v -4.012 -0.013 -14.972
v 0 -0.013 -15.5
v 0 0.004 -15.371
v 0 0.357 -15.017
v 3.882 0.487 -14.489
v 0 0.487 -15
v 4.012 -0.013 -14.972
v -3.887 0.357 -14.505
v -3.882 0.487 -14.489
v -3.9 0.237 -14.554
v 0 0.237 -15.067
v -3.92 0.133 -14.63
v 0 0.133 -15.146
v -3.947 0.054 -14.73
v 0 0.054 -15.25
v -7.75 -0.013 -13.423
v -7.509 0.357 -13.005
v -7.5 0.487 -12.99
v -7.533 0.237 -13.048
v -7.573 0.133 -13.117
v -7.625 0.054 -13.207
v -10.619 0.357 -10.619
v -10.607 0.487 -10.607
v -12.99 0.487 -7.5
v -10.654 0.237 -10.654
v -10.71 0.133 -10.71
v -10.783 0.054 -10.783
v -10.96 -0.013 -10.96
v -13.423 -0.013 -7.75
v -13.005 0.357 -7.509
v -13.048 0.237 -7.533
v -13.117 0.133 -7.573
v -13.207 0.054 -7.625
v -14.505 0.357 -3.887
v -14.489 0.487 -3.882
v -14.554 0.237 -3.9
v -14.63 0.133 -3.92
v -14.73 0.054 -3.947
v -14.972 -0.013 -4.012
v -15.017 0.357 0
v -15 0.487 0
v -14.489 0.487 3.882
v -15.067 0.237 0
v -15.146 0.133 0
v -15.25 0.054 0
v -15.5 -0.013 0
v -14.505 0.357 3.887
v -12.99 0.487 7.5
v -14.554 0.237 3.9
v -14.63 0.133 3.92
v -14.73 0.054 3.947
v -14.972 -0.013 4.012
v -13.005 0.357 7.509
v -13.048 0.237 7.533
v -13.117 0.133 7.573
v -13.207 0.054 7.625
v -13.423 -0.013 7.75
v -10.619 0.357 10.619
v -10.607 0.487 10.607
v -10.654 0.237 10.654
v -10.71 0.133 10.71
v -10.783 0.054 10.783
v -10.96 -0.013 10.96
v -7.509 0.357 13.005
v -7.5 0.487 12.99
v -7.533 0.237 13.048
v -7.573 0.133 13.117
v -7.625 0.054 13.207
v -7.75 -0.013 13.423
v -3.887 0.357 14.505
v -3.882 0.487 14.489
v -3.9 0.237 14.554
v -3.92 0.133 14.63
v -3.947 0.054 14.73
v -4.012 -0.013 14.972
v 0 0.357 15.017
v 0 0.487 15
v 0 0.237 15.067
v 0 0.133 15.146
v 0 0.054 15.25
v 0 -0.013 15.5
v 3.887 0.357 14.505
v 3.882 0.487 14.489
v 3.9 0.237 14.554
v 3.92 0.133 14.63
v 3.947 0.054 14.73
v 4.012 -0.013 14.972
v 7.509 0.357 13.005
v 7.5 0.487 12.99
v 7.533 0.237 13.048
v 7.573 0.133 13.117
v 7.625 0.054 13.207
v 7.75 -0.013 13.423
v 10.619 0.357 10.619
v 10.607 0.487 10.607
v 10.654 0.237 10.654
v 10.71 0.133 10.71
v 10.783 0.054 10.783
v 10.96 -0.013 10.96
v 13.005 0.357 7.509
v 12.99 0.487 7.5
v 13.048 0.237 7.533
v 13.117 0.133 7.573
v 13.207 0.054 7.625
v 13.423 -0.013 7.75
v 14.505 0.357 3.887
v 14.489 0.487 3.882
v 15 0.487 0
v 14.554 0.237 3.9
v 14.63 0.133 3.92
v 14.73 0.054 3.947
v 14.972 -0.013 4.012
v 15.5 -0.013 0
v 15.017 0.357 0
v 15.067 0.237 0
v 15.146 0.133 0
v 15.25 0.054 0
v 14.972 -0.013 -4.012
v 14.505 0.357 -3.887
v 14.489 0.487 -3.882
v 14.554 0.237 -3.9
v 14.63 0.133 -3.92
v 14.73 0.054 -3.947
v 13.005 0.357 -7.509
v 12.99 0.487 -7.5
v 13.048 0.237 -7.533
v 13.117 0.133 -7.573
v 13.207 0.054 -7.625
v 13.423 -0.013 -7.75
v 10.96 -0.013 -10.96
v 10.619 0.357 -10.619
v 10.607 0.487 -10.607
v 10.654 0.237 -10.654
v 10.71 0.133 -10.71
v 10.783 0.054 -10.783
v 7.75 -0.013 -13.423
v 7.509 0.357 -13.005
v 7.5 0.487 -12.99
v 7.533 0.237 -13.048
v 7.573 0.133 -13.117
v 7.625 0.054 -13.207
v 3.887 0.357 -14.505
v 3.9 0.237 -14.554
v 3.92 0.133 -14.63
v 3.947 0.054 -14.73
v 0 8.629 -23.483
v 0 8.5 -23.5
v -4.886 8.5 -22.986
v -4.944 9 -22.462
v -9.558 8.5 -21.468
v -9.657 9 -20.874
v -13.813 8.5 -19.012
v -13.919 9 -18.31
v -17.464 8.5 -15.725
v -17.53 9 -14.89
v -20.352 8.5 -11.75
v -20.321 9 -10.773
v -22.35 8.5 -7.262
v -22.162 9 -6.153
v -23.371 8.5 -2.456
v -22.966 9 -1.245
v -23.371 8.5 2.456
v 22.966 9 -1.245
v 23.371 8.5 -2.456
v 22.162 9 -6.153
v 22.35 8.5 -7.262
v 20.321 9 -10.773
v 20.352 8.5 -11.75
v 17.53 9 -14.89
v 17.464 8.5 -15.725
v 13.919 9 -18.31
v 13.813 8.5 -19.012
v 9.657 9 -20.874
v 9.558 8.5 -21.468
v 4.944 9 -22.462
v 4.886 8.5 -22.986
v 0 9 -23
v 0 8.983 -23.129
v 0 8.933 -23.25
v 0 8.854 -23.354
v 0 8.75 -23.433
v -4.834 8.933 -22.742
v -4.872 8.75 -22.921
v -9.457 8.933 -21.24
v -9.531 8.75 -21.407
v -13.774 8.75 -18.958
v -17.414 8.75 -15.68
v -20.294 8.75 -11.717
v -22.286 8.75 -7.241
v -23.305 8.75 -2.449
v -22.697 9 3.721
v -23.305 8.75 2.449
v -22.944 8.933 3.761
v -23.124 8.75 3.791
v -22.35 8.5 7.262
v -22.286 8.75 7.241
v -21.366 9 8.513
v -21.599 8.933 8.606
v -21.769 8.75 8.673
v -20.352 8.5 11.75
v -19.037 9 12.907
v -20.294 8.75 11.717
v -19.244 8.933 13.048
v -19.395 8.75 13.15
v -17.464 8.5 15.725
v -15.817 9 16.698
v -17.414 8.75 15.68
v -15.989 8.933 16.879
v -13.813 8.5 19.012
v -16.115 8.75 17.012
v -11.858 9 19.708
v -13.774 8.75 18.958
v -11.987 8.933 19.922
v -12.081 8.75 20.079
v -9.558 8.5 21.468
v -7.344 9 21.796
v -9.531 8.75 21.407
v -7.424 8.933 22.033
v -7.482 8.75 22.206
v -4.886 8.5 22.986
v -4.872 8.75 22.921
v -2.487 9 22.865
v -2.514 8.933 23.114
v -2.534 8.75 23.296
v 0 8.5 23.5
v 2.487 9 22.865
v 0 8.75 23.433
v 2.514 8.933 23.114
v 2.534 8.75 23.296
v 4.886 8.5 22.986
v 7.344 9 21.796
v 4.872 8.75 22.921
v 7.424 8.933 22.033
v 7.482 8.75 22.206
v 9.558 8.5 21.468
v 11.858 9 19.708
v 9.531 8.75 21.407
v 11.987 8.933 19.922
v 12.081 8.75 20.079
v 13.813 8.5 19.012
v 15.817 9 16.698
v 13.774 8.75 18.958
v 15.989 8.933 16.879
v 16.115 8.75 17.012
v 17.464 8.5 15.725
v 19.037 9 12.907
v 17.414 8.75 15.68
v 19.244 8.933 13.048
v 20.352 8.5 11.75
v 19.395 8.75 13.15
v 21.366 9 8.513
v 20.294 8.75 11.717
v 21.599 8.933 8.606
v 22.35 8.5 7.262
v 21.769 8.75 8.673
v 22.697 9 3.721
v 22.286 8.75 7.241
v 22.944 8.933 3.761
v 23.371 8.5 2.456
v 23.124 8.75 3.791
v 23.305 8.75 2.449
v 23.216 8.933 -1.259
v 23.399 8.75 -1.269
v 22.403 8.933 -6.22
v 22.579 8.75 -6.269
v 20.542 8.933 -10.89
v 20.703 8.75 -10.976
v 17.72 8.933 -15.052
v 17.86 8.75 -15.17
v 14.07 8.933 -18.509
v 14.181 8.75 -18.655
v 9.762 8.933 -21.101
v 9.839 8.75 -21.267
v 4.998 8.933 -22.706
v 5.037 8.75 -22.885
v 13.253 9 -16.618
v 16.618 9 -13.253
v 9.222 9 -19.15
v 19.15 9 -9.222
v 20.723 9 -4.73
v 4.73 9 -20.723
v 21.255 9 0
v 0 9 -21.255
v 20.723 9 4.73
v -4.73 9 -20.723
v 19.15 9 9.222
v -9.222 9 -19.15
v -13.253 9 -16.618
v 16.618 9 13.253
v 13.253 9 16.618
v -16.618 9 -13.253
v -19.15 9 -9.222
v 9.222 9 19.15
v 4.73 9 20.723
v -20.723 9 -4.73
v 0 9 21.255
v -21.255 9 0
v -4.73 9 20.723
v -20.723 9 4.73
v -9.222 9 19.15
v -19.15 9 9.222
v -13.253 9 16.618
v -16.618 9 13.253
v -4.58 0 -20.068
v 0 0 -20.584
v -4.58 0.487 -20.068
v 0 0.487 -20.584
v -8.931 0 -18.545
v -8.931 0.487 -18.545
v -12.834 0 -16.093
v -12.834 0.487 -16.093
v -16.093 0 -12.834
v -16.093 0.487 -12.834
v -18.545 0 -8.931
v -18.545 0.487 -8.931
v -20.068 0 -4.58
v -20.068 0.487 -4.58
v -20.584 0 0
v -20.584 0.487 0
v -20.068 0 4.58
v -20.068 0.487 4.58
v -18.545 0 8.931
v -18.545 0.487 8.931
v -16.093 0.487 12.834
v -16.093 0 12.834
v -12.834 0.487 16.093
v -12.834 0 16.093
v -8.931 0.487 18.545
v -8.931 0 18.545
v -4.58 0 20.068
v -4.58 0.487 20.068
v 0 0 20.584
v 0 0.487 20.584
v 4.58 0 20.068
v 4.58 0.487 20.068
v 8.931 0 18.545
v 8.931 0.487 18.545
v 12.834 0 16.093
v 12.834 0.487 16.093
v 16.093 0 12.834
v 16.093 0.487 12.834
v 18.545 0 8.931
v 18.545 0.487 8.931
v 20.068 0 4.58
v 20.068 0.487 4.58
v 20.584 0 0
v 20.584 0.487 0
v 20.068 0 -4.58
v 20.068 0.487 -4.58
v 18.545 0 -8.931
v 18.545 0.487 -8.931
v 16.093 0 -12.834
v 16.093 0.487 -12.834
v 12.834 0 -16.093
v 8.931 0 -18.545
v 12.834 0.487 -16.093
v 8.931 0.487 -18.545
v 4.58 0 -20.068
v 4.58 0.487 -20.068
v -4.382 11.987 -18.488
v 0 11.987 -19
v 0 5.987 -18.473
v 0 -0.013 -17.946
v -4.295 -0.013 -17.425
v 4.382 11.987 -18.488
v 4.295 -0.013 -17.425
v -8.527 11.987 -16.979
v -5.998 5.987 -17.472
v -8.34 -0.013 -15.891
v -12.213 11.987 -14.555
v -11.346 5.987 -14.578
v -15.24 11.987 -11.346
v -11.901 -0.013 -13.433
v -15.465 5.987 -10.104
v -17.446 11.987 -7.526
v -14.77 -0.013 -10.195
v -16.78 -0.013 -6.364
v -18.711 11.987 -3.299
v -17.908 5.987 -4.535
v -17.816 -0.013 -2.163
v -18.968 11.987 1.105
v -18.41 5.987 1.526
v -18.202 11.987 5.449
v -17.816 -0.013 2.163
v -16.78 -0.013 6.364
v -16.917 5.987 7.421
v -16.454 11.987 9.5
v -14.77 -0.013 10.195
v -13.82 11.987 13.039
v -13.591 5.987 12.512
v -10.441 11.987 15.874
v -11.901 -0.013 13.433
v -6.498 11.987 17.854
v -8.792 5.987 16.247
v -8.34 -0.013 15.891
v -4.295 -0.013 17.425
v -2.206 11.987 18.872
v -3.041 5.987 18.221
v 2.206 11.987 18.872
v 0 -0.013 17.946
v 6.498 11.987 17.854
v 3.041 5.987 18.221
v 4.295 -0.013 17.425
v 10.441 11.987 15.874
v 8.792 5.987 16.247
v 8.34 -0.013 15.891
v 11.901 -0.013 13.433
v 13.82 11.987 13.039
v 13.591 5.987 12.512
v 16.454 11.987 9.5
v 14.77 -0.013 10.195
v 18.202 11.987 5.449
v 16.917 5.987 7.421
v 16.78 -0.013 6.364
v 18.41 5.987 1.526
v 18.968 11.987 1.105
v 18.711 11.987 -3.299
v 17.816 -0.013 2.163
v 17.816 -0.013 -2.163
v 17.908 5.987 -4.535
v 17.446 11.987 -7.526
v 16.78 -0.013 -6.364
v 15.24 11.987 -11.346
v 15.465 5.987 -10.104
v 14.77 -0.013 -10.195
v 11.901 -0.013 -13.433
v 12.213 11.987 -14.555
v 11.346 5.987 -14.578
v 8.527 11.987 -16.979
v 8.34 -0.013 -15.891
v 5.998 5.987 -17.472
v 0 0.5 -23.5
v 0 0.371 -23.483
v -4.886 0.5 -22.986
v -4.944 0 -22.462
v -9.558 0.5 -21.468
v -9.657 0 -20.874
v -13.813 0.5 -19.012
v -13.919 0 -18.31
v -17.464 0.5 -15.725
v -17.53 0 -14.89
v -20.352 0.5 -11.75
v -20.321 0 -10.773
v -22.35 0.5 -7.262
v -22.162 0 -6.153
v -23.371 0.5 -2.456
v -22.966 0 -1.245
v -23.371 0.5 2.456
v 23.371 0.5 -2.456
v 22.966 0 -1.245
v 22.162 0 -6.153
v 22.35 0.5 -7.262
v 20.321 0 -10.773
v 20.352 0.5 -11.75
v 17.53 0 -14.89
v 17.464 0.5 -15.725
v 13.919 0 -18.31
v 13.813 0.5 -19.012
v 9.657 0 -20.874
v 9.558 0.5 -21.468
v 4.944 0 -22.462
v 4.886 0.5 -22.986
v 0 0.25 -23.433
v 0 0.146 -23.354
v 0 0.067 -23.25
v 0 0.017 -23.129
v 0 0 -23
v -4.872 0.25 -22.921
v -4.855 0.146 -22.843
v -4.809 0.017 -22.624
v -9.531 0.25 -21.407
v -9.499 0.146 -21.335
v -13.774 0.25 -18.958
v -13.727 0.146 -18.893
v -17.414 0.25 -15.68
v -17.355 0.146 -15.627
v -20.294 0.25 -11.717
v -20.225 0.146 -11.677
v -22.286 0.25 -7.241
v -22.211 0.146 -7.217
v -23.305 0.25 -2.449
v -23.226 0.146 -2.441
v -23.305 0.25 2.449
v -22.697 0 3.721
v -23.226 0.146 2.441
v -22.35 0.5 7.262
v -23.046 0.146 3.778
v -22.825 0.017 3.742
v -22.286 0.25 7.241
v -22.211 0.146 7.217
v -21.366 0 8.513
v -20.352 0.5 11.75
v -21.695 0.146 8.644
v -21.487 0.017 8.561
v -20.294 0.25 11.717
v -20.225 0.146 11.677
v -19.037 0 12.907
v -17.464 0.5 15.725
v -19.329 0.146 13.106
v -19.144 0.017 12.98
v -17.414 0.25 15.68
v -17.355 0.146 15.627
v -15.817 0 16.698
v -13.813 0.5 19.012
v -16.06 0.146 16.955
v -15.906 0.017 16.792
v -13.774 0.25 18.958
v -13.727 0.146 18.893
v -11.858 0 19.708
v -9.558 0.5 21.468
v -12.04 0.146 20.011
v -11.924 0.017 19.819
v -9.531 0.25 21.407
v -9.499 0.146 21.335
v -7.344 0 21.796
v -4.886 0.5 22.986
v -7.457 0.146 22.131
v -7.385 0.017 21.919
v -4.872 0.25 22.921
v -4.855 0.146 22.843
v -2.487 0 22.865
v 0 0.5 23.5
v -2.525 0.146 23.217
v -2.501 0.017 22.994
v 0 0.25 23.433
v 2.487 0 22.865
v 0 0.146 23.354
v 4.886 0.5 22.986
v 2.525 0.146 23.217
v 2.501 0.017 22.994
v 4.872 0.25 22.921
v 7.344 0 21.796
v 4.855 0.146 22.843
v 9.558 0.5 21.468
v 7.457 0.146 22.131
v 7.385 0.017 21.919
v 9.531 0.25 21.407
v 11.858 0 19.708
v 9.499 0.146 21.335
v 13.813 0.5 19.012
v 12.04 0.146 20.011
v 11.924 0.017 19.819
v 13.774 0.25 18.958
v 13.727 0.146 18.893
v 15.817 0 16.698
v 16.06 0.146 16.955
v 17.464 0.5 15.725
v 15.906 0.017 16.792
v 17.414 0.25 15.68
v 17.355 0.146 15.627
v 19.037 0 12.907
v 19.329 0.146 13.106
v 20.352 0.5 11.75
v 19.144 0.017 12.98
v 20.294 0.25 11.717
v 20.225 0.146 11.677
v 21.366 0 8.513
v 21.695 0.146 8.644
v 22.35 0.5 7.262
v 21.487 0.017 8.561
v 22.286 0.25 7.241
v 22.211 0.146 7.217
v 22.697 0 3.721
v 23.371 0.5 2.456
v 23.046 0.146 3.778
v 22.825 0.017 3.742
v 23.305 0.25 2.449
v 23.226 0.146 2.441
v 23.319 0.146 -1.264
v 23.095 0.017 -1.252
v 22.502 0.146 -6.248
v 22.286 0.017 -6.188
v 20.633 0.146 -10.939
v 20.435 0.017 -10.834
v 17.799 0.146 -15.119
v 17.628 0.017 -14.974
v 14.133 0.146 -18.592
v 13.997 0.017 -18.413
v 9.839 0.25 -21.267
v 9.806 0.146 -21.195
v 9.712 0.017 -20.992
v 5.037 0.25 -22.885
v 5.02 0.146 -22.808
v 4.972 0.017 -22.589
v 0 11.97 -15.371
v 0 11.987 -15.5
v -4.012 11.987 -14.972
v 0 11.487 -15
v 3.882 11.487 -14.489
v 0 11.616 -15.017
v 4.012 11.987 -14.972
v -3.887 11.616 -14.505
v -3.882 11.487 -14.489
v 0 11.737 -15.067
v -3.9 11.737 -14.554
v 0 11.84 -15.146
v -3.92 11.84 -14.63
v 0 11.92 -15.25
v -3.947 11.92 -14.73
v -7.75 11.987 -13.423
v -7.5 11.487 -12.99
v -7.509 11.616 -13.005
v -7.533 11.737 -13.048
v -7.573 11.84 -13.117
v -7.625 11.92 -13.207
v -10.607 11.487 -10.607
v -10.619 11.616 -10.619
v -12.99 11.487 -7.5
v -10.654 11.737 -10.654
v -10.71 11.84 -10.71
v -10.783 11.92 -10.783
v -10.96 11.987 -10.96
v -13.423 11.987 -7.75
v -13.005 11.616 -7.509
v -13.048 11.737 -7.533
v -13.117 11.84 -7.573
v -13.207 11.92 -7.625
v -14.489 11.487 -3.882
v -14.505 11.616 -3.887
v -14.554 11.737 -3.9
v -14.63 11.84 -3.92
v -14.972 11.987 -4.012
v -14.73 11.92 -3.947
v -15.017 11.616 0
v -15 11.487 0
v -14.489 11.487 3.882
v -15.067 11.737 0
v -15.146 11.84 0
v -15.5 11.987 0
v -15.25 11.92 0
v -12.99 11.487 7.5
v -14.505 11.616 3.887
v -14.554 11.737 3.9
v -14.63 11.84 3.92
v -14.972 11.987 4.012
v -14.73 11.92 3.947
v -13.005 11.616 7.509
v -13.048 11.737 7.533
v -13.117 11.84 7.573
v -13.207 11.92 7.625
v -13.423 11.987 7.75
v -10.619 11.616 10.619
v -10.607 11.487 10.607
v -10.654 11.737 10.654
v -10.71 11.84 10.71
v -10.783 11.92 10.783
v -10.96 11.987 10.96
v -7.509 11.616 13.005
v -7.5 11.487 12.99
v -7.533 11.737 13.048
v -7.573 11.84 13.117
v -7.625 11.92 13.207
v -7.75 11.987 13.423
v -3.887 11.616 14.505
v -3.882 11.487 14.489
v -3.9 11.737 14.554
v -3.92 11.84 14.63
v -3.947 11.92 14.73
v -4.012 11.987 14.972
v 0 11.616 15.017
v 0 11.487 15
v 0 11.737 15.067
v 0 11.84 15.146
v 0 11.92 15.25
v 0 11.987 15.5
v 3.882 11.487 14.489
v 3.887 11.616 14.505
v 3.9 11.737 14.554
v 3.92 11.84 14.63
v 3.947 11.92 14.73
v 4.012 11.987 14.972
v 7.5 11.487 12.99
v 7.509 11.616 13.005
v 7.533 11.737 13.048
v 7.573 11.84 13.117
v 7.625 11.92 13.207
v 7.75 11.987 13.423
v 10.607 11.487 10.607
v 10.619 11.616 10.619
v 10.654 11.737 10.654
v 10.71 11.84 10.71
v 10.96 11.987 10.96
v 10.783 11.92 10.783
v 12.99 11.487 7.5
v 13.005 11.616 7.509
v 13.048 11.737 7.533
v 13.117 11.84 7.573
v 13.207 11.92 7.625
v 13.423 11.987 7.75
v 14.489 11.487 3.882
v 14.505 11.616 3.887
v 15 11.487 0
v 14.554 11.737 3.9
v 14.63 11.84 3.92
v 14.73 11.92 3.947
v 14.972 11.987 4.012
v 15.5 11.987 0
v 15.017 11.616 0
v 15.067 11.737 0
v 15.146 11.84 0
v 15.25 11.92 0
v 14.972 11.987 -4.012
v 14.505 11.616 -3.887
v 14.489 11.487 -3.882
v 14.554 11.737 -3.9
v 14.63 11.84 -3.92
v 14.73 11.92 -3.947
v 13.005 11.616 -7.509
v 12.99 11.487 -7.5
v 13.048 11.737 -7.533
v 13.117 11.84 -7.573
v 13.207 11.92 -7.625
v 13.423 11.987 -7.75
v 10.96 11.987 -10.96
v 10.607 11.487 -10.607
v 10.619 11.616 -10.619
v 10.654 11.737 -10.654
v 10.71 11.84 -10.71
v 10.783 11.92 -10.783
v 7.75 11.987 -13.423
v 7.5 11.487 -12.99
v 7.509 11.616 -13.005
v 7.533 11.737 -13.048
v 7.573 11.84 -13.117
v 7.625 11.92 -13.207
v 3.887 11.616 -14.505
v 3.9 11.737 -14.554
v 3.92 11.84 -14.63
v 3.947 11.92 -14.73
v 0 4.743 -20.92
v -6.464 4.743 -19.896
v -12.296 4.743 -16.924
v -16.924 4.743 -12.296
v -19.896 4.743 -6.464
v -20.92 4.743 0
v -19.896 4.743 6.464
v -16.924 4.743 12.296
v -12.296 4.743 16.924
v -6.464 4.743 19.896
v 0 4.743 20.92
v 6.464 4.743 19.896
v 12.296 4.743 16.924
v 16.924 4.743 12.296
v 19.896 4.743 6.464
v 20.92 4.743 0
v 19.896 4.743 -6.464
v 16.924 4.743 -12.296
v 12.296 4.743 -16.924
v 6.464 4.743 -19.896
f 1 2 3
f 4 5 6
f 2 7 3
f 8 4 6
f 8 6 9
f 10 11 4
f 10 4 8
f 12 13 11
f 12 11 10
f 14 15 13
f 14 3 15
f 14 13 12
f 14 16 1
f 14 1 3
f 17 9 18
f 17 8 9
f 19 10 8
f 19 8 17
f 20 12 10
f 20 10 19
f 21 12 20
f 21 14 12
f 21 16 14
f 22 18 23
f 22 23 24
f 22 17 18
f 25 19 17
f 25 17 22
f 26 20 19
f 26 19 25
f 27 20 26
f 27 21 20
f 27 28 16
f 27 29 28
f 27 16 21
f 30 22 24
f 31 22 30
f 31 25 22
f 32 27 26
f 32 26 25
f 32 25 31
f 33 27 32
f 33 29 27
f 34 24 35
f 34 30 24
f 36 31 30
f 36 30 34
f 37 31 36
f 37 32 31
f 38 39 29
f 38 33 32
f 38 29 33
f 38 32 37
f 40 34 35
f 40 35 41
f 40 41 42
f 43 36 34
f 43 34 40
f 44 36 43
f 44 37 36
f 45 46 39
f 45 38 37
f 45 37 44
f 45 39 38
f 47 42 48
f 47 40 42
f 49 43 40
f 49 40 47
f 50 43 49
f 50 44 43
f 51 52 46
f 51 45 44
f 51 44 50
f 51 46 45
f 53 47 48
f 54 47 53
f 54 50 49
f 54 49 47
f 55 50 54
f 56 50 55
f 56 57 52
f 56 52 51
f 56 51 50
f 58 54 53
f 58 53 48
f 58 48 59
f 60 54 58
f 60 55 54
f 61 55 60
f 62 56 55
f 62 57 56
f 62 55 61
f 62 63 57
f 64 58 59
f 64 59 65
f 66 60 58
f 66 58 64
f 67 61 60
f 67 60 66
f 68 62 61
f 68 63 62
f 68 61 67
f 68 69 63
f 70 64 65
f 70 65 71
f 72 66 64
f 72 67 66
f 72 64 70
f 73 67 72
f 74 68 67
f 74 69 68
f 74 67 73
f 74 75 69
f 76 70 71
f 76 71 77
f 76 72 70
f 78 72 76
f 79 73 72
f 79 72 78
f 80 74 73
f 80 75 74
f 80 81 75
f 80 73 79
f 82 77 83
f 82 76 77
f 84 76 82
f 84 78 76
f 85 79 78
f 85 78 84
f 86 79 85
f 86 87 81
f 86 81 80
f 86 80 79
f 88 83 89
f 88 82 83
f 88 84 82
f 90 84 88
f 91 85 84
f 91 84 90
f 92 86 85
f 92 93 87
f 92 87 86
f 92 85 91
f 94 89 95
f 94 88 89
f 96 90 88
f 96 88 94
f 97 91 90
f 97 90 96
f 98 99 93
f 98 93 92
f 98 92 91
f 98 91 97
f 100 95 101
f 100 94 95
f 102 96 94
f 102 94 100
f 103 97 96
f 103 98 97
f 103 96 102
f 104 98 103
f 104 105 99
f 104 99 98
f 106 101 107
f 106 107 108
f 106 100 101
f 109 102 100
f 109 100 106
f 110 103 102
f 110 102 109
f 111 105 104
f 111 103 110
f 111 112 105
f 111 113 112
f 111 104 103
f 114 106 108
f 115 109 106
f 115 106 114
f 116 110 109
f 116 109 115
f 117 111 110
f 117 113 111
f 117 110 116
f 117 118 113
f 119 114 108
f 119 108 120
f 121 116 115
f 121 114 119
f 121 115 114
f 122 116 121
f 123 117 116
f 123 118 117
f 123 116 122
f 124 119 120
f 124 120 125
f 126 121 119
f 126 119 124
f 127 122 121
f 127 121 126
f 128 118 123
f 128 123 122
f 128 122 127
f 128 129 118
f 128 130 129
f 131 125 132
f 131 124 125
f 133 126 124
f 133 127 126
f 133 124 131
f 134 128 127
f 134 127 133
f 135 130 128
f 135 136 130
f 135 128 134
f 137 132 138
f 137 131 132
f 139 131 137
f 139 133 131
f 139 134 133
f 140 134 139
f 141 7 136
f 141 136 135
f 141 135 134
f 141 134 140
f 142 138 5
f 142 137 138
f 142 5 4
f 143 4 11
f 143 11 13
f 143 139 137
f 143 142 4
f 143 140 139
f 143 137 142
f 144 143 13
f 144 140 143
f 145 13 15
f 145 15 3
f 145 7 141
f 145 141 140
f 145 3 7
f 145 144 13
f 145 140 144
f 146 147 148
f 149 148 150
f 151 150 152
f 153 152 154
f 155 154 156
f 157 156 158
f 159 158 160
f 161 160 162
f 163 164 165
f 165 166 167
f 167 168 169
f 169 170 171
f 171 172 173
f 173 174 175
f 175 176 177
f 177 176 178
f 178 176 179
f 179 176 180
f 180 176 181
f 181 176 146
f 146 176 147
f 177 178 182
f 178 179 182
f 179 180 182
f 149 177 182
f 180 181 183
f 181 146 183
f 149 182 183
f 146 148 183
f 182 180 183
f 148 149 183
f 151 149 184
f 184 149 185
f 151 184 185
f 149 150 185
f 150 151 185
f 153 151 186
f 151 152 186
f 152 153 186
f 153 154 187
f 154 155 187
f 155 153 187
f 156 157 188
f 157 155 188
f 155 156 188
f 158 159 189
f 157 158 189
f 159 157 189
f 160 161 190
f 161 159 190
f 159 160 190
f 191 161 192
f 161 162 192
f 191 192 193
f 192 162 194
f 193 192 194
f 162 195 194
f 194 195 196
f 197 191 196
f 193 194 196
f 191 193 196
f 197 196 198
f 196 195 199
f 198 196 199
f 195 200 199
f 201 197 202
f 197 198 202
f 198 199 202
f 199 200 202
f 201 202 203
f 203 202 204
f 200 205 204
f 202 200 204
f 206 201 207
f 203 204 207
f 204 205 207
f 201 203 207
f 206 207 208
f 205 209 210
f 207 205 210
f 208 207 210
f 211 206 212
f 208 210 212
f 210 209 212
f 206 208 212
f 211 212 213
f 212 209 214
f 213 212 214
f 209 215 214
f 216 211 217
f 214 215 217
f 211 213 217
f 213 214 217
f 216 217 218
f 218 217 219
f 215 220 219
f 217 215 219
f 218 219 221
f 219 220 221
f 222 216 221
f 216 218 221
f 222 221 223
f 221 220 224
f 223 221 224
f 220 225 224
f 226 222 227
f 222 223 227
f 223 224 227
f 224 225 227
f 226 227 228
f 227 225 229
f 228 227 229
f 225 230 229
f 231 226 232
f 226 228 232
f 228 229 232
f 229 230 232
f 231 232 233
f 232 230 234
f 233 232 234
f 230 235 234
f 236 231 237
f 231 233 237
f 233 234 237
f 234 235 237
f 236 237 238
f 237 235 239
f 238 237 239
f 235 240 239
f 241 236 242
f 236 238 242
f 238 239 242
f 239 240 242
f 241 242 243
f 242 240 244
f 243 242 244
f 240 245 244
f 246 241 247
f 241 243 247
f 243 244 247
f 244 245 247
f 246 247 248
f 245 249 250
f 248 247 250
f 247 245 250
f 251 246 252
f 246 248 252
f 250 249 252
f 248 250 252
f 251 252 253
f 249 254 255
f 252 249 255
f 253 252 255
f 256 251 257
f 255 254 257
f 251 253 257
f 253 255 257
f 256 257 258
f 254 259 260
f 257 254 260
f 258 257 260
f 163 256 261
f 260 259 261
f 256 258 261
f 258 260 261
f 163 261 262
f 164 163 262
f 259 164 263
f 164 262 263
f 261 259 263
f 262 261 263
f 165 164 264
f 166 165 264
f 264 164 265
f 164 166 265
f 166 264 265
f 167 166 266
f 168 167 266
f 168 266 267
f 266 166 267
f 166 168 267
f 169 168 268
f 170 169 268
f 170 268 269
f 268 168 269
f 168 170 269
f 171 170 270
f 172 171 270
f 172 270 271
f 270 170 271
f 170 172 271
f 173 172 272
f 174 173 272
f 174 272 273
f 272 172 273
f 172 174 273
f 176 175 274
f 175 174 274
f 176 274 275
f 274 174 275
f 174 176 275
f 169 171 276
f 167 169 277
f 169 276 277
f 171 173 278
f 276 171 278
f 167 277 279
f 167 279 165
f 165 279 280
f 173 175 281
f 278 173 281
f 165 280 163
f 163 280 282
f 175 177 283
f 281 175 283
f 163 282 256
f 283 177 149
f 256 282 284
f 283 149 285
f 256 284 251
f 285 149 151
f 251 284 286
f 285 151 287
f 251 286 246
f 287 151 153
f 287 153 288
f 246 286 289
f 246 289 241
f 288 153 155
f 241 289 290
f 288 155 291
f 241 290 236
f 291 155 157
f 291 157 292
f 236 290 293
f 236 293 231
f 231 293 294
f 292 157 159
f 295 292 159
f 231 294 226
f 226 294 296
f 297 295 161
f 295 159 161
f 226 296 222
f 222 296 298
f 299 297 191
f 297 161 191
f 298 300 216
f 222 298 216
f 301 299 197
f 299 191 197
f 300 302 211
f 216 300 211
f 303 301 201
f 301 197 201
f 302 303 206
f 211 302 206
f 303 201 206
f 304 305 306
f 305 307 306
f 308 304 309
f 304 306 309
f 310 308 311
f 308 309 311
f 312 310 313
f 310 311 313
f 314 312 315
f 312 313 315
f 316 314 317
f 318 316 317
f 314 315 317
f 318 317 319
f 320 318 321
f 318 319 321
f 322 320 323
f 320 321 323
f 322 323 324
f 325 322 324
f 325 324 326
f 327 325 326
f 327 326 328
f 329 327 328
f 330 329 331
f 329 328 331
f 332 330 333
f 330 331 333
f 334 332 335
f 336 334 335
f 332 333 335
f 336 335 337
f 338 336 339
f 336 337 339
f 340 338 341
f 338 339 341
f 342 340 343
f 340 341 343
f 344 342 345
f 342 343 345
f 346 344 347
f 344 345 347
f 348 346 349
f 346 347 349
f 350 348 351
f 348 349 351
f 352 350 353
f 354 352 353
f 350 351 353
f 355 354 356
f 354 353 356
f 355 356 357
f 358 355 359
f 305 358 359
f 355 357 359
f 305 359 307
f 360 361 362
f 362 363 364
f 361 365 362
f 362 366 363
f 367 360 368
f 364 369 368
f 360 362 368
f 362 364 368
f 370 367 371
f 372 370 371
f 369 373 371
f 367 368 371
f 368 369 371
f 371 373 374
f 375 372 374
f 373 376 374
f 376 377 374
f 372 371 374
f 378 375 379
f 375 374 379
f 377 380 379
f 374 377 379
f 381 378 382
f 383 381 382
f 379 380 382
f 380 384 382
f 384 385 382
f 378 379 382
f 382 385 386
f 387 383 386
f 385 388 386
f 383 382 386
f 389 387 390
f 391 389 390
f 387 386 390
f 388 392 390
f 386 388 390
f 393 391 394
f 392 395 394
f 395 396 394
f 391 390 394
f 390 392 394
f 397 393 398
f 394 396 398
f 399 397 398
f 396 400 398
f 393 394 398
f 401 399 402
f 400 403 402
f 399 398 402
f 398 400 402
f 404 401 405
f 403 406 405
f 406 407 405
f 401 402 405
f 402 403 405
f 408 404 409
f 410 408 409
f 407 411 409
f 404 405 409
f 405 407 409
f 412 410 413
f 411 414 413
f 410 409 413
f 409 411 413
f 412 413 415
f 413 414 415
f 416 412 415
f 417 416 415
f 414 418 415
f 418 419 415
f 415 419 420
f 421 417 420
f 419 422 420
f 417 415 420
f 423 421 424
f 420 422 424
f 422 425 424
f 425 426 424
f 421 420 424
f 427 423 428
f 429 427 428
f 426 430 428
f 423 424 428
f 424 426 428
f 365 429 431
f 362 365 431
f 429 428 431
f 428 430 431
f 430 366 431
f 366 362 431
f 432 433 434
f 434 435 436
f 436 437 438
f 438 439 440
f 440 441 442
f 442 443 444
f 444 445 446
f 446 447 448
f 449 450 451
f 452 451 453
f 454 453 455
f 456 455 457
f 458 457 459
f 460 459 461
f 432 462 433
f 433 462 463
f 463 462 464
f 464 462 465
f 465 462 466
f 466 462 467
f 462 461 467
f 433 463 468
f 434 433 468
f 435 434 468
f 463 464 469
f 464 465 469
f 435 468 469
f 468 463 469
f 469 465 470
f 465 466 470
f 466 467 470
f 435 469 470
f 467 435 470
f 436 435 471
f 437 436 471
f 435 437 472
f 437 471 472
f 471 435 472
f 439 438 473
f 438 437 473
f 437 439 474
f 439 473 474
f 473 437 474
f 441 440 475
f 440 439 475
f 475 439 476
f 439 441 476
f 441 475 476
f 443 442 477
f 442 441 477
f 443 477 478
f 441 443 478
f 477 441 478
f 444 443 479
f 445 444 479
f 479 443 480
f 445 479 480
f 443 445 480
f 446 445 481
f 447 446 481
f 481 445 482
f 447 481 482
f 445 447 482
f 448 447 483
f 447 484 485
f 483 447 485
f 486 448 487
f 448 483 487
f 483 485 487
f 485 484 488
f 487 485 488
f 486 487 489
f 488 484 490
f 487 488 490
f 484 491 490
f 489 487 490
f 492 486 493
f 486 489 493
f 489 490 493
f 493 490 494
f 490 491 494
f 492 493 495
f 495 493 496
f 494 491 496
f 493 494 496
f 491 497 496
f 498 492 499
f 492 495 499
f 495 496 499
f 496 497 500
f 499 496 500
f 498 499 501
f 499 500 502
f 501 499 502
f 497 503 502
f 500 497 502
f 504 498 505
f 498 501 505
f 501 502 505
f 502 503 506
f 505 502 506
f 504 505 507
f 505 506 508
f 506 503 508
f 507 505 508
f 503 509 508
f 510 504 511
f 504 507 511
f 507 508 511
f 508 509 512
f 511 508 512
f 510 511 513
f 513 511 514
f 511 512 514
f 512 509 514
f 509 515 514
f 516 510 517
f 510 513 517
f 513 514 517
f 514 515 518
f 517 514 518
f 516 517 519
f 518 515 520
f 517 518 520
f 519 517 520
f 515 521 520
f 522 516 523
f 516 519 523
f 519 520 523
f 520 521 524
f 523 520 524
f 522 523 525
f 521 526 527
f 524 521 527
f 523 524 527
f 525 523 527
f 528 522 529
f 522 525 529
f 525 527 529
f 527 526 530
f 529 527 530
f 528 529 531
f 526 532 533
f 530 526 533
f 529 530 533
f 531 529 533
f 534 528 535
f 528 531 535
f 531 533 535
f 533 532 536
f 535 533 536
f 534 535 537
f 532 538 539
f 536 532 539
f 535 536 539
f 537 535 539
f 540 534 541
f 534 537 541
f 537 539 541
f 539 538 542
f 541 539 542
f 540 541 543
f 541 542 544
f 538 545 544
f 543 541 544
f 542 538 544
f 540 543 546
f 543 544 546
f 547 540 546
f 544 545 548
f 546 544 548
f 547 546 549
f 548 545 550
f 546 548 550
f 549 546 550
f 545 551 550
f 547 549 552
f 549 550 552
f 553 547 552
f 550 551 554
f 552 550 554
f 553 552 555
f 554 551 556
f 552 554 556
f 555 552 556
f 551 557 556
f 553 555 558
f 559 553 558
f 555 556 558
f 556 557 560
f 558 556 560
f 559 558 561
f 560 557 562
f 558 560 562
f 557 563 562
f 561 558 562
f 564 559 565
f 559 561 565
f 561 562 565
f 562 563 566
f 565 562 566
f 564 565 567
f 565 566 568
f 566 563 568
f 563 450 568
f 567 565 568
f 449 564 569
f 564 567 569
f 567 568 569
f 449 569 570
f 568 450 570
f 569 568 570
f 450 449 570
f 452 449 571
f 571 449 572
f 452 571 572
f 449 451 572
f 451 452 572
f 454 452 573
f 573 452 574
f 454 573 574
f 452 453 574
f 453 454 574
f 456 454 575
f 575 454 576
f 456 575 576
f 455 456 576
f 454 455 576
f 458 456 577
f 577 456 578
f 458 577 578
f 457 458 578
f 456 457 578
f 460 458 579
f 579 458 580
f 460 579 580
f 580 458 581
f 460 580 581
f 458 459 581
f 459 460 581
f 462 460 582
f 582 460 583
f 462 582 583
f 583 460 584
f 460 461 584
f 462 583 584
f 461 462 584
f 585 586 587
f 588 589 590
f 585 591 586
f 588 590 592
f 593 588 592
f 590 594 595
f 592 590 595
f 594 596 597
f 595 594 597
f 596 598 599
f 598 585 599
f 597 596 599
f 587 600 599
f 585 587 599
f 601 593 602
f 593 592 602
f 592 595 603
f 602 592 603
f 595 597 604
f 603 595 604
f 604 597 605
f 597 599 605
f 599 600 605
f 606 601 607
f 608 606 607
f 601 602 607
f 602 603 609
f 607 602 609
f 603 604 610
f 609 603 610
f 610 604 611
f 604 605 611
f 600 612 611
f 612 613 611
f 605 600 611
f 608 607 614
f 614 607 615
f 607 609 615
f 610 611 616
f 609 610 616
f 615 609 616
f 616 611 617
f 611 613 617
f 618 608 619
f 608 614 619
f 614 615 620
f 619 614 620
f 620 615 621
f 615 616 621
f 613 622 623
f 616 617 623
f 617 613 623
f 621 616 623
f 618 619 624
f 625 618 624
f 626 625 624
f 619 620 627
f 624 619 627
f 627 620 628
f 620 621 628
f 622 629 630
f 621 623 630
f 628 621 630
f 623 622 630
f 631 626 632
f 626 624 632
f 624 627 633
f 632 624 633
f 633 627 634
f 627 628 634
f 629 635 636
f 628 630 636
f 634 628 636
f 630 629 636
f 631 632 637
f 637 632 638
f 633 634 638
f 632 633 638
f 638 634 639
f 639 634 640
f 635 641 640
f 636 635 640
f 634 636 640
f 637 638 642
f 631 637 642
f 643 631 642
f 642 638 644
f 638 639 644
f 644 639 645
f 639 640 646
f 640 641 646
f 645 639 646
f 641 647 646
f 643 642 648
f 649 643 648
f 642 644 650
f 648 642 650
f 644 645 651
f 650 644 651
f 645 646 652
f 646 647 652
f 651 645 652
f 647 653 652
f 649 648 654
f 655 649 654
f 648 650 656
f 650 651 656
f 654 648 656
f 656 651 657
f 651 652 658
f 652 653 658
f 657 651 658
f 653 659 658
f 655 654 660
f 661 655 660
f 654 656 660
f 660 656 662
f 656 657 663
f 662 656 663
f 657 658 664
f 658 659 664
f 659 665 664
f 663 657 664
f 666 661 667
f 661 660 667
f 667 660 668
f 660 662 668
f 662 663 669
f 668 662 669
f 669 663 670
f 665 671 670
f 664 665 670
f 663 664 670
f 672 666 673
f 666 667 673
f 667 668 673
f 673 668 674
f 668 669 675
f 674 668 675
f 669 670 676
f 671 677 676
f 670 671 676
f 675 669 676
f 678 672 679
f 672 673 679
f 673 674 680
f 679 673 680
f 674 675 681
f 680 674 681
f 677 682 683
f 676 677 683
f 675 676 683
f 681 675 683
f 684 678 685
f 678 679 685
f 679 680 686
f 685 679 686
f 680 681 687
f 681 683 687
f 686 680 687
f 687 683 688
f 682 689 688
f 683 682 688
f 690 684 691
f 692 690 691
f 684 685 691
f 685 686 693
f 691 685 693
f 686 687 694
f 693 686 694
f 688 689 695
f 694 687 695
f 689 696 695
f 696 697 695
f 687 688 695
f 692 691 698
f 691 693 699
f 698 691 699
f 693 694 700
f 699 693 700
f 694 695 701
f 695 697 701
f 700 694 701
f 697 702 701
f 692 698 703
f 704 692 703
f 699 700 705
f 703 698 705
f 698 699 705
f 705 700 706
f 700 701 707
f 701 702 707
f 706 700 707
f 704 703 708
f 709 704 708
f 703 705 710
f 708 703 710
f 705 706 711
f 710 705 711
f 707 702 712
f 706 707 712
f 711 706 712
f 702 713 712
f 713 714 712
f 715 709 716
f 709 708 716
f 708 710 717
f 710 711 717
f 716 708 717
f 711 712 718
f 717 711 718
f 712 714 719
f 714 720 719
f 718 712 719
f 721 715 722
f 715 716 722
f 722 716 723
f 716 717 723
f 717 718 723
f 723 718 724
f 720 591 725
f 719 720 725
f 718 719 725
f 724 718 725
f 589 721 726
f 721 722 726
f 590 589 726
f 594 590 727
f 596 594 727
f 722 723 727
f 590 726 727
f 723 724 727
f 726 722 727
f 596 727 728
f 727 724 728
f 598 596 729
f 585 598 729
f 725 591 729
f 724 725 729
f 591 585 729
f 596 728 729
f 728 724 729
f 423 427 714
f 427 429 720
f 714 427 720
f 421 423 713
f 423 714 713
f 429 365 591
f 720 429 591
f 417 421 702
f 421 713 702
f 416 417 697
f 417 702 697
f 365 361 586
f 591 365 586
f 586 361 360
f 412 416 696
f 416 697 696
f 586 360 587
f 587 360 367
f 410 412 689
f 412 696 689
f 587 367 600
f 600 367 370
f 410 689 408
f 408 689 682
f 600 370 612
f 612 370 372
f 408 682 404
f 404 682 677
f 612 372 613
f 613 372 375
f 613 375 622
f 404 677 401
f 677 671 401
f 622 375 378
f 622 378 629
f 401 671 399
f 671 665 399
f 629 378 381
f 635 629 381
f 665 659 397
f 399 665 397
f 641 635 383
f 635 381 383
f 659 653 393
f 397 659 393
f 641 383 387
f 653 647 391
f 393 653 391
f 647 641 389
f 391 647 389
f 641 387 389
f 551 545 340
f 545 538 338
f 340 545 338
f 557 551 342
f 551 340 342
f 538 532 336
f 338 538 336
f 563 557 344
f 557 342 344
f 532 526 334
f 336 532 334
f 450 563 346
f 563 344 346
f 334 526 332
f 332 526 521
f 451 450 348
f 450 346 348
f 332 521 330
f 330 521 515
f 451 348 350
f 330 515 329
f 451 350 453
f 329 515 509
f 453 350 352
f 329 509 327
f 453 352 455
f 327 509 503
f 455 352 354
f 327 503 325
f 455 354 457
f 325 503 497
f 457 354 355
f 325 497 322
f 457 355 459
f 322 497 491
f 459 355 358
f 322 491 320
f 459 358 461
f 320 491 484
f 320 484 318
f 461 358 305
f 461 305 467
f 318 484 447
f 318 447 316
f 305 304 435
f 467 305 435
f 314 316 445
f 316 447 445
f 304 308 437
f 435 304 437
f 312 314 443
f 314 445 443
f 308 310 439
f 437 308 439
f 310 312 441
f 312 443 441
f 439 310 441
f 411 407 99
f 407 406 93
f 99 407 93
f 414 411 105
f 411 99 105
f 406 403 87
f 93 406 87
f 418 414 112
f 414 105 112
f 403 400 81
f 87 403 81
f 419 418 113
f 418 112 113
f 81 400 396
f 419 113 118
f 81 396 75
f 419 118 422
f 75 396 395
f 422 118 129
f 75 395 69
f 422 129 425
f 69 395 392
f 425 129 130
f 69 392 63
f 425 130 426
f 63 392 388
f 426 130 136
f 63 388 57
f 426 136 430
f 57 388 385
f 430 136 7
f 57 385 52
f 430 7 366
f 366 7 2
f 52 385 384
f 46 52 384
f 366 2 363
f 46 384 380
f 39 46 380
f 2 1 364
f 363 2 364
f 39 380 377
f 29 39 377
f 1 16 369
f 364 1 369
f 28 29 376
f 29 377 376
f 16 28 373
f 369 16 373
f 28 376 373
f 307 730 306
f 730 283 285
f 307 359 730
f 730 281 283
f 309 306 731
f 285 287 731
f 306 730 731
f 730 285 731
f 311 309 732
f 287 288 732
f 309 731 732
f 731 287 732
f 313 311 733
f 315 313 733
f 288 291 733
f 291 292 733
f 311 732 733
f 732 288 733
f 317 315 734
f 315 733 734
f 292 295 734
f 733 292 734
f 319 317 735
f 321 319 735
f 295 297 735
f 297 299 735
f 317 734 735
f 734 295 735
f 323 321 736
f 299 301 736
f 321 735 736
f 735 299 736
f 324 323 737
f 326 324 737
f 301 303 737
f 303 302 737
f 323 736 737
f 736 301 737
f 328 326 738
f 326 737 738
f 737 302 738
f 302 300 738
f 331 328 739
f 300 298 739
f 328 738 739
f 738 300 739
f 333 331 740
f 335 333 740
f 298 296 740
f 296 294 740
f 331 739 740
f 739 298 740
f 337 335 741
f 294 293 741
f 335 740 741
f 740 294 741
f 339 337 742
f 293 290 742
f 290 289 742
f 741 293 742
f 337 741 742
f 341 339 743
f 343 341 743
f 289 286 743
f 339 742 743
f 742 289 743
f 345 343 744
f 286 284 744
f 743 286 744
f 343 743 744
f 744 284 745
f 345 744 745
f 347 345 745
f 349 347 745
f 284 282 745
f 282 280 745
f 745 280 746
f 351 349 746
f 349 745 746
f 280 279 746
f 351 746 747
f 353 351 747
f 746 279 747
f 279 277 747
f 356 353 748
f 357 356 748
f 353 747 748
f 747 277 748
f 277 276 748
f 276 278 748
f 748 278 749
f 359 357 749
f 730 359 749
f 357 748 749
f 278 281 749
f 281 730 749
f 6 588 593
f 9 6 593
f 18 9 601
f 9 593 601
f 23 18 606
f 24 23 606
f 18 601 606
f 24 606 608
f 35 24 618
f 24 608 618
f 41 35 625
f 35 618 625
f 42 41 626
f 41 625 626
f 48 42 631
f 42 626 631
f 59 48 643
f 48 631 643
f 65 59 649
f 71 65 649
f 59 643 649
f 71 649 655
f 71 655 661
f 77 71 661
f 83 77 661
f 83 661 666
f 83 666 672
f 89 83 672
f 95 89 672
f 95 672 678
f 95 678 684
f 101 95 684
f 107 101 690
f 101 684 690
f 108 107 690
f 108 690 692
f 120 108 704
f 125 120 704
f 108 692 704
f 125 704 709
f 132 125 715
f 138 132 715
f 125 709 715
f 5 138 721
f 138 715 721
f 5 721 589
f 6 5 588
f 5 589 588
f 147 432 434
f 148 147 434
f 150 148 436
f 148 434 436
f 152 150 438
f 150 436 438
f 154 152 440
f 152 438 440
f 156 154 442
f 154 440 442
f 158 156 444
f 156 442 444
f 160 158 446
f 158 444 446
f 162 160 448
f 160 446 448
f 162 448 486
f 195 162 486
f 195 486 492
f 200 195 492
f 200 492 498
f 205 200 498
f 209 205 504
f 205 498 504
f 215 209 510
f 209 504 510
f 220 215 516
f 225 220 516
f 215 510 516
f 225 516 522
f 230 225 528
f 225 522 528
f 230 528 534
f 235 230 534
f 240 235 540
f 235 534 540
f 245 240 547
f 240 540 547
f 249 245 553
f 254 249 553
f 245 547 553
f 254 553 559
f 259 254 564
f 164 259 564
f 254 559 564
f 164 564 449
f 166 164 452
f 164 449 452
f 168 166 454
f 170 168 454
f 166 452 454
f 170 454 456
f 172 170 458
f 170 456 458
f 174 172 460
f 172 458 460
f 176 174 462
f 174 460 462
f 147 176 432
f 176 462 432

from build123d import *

# Parameters (mm, degrees)
VERRUNDUNG1_R = 0.5
VERRUNDUNG2_R = 0.5


with BuildPart() as part:
    # Skizze1 → Rotation1 (revolve)
    with BuildSketch(Plane.XY, mode=Mode.PRIVATE) as rotation1_sk:
        Polygon((15, -0.013170206), (15, 11.986829794), (19, 11.986829794), (17.94647296, -0.013170206), align=None)
        Polygon((21.255424897, 9), (23.5, 9), (23.5, 0), (20.583672238, 0), (20.583672238, 0.486829794), align=None)
    revolve(rotation1_sk.sketch.rotate(Axis((0, 0, 0), (0, 1, 0)), 90), axis=Axis((0, 0, 0), (0, 1, 0)))

    # Verrundung1
    verrundung1_edges = [part.edges().sort_by_distance(p)[0] for p in [
        (0, 11.986829794, 15),
        (0, -0.013170206, 15),
    ]]
    fillet(verrundung1_edges, radius=VERRUNDUNG1_R)

    # Verrundung2
    verrundung2_edges = [part.edges().sort_by_distance(p)[0] for p in [
        (0, 0, 23.5),
        (0, 9, 23.5),
    ]]
    fillet(verrundung2_edges, radius=VERRUNDUNG2_R)


solid = part.part
